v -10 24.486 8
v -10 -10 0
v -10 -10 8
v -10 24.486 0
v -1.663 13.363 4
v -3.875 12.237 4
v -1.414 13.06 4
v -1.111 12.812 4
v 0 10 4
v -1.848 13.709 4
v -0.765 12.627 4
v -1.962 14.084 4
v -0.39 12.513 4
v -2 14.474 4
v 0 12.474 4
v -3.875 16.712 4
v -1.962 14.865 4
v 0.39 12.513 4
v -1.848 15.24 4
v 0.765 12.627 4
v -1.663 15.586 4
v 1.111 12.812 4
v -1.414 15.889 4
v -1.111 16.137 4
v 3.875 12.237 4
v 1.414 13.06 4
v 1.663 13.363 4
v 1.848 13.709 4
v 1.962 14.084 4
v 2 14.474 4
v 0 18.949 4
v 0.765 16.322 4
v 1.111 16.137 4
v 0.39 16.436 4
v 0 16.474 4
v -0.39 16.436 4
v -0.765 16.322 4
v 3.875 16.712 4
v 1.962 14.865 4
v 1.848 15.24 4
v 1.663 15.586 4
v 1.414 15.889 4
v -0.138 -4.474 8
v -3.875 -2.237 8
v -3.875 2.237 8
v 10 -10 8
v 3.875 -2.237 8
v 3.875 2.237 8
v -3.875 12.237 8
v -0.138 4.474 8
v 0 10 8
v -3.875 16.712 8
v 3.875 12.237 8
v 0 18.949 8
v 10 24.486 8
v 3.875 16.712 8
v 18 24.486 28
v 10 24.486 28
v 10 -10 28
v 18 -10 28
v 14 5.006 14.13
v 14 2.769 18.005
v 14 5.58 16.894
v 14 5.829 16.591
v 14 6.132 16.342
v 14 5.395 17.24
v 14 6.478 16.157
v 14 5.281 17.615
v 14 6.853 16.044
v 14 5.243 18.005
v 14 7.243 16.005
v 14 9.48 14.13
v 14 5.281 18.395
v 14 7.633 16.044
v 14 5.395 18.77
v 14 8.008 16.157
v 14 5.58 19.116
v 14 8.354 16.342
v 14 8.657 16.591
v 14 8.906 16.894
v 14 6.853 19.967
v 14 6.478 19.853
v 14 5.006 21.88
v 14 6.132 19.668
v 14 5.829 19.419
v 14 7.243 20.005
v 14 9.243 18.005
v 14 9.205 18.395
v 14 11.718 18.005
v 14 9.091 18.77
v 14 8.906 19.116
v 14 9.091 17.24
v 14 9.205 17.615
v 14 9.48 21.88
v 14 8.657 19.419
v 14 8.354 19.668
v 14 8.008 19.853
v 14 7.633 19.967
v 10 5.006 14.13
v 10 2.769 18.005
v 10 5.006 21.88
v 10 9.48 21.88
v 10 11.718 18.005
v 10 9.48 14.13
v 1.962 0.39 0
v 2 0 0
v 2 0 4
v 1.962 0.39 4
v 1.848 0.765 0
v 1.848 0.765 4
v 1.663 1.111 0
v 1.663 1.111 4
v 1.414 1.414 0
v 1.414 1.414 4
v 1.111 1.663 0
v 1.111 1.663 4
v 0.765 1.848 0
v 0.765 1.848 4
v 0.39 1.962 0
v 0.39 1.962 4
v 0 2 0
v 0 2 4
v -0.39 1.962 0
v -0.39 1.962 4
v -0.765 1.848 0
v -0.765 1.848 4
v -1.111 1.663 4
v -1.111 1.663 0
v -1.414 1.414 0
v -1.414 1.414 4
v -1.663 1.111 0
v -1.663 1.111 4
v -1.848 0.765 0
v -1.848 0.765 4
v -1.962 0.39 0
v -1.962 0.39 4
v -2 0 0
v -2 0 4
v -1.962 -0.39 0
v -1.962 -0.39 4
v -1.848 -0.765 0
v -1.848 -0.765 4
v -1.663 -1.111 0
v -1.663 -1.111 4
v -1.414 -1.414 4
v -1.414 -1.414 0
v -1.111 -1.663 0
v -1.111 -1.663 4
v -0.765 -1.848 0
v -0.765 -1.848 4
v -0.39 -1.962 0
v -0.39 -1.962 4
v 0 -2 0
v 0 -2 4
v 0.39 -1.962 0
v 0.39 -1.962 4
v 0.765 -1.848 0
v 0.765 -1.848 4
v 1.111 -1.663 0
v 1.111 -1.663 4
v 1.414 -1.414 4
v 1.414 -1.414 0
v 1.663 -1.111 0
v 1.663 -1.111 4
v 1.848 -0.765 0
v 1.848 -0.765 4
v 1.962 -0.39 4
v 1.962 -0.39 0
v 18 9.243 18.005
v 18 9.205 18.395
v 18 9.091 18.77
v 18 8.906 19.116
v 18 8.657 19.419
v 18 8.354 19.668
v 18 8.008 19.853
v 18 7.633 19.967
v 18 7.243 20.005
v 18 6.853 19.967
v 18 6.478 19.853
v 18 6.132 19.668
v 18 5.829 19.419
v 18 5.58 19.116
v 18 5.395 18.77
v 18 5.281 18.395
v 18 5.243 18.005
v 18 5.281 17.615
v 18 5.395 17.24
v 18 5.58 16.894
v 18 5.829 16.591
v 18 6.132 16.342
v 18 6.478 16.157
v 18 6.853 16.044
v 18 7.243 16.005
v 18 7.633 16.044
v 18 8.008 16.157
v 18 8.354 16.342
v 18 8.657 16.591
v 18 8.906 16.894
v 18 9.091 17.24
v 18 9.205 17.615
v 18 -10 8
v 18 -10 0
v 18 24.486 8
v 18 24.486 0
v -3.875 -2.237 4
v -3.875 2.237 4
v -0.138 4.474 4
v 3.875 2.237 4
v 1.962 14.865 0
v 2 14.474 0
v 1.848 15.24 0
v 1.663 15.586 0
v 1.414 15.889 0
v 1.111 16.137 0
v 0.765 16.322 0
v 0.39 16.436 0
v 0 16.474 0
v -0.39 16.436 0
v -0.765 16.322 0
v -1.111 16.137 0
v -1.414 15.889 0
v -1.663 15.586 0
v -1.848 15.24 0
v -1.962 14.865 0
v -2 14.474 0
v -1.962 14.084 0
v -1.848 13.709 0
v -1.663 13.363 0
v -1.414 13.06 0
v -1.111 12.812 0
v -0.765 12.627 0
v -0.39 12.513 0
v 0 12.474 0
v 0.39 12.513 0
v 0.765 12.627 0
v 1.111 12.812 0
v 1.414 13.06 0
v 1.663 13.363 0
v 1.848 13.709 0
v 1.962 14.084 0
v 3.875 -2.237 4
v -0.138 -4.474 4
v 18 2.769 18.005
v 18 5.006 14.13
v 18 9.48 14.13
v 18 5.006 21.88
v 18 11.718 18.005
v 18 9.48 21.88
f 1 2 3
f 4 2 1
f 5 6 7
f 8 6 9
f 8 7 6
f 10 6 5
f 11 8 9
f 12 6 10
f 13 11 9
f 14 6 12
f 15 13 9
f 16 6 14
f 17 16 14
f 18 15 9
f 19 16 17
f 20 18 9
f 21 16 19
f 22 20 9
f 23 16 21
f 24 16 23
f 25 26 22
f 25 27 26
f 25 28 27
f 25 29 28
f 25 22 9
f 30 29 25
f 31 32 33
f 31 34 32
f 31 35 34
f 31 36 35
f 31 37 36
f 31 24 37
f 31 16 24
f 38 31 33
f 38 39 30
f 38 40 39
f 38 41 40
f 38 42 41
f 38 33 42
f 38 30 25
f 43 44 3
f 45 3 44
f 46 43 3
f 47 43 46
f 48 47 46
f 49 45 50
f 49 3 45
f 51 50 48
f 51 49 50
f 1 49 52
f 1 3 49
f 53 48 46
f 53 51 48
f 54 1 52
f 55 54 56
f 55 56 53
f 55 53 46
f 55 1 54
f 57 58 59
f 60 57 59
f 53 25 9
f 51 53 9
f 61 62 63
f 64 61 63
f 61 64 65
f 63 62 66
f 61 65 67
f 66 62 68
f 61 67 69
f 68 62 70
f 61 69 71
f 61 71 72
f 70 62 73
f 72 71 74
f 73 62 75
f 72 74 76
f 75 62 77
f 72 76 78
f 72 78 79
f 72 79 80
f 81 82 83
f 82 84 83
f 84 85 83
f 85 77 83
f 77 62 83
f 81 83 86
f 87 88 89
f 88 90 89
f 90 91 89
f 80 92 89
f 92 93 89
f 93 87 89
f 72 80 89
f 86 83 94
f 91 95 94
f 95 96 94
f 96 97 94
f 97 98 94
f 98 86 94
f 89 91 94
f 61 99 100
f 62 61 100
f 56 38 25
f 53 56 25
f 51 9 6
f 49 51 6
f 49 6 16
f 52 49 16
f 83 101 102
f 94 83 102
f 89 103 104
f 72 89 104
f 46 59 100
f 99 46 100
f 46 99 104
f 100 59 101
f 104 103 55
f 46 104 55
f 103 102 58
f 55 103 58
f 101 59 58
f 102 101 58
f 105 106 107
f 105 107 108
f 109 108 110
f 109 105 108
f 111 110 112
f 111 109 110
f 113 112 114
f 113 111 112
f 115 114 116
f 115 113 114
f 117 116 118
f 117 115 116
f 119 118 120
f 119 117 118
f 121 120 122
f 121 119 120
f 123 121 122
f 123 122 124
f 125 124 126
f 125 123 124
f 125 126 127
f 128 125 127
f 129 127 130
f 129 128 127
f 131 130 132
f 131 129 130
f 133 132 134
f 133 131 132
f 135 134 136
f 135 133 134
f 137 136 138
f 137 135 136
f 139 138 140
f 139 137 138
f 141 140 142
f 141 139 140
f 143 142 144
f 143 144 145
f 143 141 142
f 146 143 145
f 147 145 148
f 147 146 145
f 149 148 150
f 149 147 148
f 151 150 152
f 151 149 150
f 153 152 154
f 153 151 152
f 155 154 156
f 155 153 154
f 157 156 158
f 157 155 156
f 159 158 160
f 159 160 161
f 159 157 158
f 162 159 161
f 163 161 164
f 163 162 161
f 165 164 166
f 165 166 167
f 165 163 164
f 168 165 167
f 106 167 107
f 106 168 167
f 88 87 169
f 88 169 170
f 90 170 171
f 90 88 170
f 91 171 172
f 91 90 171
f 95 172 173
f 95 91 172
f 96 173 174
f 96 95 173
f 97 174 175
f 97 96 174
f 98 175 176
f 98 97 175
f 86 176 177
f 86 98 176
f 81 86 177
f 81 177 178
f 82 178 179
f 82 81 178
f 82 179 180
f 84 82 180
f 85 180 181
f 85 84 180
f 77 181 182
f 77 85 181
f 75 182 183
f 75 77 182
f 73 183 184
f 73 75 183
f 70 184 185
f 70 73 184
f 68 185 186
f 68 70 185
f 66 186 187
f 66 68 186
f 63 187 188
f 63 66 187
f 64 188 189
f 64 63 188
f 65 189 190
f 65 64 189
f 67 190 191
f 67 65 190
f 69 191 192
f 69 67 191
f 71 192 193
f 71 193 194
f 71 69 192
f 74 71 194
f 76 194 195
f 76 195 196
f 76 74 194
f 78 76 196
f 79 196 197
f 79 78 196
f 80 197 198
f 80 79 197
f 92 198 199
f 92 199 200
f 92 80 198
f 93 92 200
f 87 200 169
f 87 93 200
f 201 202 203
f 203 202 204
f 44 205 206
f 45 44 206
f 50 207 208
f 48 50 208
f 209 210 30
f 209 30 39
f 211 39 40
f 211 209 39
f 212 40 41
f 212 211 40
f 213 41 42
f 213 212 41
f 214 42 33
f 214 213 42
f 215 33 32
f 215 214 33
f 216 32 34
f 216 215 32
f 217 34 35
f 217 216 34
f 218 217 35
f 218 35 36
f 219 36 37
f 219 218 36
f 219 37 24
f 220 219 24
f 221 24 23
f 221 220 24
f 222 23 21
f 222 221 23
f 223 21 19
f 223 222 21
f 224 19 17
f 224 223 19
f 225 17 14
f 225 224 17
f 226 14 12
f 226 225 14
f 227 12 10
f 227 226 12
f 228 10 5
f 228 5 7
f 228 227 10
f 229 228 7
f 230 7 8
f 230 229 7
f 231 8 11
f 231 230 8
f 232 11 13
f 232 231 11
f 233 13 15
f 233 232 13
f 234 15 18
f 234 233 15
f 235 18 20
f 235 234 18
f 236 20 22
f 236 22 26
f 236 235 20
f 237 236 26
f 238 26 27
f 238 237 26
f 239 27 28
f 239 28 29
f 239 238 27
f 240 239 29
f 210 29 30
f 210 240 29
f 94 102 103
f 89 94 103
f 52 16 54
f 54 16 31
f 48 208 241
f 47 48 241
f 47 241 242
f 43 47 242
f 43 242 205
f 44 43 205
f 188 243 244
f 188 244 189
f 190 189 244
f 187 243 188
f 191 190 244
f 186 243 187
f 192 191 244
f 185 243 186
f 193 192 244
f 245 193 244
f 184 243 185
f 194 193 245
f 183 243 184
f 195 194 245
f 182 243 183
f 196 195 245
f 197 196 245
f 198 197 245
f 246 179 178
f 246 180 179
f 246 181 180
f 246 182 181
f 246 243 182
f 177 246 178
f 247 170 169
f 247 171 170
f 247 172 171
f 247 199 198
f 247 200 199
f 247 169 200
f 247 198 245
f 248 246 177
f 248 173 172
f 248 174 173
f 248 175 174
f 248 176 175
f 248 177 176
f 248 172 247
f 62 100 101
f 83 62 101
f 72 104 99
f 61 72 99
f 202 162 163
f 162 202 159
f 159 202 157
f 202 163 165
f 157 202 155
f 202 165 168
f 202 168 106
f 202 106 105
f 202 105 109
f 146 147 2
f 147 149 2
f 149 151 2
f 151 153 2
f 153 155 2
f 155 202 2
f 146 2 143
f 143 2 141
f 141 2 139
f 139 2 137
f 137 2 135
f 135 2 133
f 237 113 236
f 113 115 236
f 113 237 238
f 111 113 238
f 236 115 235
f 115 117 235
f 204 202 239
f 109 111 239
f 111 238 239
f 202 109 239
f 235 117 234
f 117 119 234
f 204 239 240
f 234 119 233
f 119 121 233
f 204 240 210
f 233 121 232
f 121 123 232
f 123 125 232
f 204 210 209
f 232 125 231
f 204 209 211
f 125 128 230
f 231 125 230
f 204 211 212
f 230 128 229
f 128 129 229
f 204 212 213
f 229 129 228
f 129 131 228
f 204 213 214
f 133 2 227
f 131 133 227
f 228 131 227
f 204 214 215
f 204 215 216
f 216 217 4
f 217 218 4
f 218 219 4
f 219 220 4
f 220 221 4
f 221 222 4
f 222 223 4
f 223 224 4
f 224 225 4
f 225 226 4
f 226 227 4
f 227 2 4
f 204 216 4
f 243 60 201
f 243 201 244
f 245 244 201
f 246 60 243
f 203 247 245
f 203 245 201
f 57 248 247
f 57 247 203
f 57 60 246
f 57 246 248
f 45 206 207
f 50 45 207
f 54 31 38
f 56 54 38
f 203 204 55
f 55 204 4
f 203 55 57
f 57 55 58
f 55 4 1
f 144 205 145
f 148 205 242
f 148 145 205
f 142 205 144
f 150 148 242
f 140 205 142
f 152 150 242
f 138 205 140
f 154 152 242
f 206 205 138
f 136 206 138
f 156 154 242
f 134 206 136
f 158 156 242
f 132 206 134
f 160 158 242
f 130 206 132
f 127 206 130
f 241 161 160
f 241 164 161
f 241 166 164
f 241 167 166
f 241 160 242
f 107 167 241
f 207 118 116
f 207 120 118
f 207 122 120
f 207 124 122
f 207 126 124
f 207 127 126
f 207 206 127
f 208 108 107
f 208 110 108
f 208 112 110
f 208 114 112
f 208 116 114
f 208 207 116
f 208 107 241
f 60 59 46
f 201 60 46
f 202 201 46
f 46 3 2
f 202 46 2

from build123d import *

# Parameters (mm, degrees)
F0_W     = 28
F0_H     = 34.4861291724
F1_DEPTH = 8
F0_R     = 2
F2_DEPTH = 4
F4_START = 10
F4_DEPTH = 7.9999894
F5_START = 14
F3_R     = 2
F5_DEPTH = 4


with BuildPart() as f1:
    # F0 (on Top) → F1 (new body)
    with BuildSketch(Plane.XY):
        with Locations((4, 7.2430645862)):
            Rectangle(F0_W, F0_H)
        Polygon((3.875, 2.2372322931), (3.875, -2.2372322931), (-0.1381988935, -4.4744645862), (-3.875, -2.2372322931), (-3.875, 2.2372322931), (-0.1381988935, 4.4744645862), align=None, mode=Mode.SUBTRACT)
        Polygon((3.875, 16.7116968793), (3.875, 12.2372322931), (0, 10), (-3.875, 12.2372322931), (-3.875, 16.7116968793), (0, 18.9489291724), align=None, mode=Mode.SUBTRACT)
    extrude(amount=F1_DEPTH)

    # F0 (on Top) → F2 (join)
    with BuildSketch(Plane.XY):
        Polygon((0, 10), (3.875, 12.2372322931), (3.875, 16.7116968793), (0, 18.9489291724), (-3.875, 16.7116968793), (-3.875, 12.2372322931), align=None)
        with Locations((0, 14.4744645862)):
            Circle(F0_R, mode=Mode.SUBTRACT)
        Polygon((-0.1381988935, -4.4744645862), (3.875, -2.2372322931), (3.875, 2.2372322931), (-0.1381988935, 4.4744645862), (-3.875, 2.2372322931), (-3.875, -2.2372322931), align=None)
        Circle(F0_R, mode=Mode.SUBTRACT)
    extrude(amount=F2_DEPTH)

    # F3 (on Right) → F4 (join)
    with BuildSketch(Plane.YZ.offset(F4_START)):
        Polygon((-10, 27.9999948), (-10, 0), (24.4861291724, 0), (24.4861291724, 27.9999948), (7.2430645862, 27.9999948), align=None)
        Polygon((2.7686, 18.0050948), (5.0058322931, 21.8800948), (9.4802968793, 21.8800948), (11.7175291724, 18.0050948), (9.4802968793, 14.1300948), (5.0058322931, 14.1300948), align=None, mode=Mode.SUBTRACT)
    extrude(amount=F4_DEPTH)

    # F3 (on Right) → F5 (join)
    with BuildSketch(Plane.YZ.offset(F5_START)):
        Polygon((9.4802968793, 21.8800948), (5.0058322931, 21.8800948), (2.7686, 18.0050948), (5.0058322931, 14.1300948), (9.4802968793, 14.1300948), (11.7175291724, 18.0050948), align=None)
        with Locations((7.2430645862, 18.0050948)):
            Circle(F3_R, mode=Mode.SUBTRACT)
    extrude(amount=F5_DEPTH)


solid = f1.part
